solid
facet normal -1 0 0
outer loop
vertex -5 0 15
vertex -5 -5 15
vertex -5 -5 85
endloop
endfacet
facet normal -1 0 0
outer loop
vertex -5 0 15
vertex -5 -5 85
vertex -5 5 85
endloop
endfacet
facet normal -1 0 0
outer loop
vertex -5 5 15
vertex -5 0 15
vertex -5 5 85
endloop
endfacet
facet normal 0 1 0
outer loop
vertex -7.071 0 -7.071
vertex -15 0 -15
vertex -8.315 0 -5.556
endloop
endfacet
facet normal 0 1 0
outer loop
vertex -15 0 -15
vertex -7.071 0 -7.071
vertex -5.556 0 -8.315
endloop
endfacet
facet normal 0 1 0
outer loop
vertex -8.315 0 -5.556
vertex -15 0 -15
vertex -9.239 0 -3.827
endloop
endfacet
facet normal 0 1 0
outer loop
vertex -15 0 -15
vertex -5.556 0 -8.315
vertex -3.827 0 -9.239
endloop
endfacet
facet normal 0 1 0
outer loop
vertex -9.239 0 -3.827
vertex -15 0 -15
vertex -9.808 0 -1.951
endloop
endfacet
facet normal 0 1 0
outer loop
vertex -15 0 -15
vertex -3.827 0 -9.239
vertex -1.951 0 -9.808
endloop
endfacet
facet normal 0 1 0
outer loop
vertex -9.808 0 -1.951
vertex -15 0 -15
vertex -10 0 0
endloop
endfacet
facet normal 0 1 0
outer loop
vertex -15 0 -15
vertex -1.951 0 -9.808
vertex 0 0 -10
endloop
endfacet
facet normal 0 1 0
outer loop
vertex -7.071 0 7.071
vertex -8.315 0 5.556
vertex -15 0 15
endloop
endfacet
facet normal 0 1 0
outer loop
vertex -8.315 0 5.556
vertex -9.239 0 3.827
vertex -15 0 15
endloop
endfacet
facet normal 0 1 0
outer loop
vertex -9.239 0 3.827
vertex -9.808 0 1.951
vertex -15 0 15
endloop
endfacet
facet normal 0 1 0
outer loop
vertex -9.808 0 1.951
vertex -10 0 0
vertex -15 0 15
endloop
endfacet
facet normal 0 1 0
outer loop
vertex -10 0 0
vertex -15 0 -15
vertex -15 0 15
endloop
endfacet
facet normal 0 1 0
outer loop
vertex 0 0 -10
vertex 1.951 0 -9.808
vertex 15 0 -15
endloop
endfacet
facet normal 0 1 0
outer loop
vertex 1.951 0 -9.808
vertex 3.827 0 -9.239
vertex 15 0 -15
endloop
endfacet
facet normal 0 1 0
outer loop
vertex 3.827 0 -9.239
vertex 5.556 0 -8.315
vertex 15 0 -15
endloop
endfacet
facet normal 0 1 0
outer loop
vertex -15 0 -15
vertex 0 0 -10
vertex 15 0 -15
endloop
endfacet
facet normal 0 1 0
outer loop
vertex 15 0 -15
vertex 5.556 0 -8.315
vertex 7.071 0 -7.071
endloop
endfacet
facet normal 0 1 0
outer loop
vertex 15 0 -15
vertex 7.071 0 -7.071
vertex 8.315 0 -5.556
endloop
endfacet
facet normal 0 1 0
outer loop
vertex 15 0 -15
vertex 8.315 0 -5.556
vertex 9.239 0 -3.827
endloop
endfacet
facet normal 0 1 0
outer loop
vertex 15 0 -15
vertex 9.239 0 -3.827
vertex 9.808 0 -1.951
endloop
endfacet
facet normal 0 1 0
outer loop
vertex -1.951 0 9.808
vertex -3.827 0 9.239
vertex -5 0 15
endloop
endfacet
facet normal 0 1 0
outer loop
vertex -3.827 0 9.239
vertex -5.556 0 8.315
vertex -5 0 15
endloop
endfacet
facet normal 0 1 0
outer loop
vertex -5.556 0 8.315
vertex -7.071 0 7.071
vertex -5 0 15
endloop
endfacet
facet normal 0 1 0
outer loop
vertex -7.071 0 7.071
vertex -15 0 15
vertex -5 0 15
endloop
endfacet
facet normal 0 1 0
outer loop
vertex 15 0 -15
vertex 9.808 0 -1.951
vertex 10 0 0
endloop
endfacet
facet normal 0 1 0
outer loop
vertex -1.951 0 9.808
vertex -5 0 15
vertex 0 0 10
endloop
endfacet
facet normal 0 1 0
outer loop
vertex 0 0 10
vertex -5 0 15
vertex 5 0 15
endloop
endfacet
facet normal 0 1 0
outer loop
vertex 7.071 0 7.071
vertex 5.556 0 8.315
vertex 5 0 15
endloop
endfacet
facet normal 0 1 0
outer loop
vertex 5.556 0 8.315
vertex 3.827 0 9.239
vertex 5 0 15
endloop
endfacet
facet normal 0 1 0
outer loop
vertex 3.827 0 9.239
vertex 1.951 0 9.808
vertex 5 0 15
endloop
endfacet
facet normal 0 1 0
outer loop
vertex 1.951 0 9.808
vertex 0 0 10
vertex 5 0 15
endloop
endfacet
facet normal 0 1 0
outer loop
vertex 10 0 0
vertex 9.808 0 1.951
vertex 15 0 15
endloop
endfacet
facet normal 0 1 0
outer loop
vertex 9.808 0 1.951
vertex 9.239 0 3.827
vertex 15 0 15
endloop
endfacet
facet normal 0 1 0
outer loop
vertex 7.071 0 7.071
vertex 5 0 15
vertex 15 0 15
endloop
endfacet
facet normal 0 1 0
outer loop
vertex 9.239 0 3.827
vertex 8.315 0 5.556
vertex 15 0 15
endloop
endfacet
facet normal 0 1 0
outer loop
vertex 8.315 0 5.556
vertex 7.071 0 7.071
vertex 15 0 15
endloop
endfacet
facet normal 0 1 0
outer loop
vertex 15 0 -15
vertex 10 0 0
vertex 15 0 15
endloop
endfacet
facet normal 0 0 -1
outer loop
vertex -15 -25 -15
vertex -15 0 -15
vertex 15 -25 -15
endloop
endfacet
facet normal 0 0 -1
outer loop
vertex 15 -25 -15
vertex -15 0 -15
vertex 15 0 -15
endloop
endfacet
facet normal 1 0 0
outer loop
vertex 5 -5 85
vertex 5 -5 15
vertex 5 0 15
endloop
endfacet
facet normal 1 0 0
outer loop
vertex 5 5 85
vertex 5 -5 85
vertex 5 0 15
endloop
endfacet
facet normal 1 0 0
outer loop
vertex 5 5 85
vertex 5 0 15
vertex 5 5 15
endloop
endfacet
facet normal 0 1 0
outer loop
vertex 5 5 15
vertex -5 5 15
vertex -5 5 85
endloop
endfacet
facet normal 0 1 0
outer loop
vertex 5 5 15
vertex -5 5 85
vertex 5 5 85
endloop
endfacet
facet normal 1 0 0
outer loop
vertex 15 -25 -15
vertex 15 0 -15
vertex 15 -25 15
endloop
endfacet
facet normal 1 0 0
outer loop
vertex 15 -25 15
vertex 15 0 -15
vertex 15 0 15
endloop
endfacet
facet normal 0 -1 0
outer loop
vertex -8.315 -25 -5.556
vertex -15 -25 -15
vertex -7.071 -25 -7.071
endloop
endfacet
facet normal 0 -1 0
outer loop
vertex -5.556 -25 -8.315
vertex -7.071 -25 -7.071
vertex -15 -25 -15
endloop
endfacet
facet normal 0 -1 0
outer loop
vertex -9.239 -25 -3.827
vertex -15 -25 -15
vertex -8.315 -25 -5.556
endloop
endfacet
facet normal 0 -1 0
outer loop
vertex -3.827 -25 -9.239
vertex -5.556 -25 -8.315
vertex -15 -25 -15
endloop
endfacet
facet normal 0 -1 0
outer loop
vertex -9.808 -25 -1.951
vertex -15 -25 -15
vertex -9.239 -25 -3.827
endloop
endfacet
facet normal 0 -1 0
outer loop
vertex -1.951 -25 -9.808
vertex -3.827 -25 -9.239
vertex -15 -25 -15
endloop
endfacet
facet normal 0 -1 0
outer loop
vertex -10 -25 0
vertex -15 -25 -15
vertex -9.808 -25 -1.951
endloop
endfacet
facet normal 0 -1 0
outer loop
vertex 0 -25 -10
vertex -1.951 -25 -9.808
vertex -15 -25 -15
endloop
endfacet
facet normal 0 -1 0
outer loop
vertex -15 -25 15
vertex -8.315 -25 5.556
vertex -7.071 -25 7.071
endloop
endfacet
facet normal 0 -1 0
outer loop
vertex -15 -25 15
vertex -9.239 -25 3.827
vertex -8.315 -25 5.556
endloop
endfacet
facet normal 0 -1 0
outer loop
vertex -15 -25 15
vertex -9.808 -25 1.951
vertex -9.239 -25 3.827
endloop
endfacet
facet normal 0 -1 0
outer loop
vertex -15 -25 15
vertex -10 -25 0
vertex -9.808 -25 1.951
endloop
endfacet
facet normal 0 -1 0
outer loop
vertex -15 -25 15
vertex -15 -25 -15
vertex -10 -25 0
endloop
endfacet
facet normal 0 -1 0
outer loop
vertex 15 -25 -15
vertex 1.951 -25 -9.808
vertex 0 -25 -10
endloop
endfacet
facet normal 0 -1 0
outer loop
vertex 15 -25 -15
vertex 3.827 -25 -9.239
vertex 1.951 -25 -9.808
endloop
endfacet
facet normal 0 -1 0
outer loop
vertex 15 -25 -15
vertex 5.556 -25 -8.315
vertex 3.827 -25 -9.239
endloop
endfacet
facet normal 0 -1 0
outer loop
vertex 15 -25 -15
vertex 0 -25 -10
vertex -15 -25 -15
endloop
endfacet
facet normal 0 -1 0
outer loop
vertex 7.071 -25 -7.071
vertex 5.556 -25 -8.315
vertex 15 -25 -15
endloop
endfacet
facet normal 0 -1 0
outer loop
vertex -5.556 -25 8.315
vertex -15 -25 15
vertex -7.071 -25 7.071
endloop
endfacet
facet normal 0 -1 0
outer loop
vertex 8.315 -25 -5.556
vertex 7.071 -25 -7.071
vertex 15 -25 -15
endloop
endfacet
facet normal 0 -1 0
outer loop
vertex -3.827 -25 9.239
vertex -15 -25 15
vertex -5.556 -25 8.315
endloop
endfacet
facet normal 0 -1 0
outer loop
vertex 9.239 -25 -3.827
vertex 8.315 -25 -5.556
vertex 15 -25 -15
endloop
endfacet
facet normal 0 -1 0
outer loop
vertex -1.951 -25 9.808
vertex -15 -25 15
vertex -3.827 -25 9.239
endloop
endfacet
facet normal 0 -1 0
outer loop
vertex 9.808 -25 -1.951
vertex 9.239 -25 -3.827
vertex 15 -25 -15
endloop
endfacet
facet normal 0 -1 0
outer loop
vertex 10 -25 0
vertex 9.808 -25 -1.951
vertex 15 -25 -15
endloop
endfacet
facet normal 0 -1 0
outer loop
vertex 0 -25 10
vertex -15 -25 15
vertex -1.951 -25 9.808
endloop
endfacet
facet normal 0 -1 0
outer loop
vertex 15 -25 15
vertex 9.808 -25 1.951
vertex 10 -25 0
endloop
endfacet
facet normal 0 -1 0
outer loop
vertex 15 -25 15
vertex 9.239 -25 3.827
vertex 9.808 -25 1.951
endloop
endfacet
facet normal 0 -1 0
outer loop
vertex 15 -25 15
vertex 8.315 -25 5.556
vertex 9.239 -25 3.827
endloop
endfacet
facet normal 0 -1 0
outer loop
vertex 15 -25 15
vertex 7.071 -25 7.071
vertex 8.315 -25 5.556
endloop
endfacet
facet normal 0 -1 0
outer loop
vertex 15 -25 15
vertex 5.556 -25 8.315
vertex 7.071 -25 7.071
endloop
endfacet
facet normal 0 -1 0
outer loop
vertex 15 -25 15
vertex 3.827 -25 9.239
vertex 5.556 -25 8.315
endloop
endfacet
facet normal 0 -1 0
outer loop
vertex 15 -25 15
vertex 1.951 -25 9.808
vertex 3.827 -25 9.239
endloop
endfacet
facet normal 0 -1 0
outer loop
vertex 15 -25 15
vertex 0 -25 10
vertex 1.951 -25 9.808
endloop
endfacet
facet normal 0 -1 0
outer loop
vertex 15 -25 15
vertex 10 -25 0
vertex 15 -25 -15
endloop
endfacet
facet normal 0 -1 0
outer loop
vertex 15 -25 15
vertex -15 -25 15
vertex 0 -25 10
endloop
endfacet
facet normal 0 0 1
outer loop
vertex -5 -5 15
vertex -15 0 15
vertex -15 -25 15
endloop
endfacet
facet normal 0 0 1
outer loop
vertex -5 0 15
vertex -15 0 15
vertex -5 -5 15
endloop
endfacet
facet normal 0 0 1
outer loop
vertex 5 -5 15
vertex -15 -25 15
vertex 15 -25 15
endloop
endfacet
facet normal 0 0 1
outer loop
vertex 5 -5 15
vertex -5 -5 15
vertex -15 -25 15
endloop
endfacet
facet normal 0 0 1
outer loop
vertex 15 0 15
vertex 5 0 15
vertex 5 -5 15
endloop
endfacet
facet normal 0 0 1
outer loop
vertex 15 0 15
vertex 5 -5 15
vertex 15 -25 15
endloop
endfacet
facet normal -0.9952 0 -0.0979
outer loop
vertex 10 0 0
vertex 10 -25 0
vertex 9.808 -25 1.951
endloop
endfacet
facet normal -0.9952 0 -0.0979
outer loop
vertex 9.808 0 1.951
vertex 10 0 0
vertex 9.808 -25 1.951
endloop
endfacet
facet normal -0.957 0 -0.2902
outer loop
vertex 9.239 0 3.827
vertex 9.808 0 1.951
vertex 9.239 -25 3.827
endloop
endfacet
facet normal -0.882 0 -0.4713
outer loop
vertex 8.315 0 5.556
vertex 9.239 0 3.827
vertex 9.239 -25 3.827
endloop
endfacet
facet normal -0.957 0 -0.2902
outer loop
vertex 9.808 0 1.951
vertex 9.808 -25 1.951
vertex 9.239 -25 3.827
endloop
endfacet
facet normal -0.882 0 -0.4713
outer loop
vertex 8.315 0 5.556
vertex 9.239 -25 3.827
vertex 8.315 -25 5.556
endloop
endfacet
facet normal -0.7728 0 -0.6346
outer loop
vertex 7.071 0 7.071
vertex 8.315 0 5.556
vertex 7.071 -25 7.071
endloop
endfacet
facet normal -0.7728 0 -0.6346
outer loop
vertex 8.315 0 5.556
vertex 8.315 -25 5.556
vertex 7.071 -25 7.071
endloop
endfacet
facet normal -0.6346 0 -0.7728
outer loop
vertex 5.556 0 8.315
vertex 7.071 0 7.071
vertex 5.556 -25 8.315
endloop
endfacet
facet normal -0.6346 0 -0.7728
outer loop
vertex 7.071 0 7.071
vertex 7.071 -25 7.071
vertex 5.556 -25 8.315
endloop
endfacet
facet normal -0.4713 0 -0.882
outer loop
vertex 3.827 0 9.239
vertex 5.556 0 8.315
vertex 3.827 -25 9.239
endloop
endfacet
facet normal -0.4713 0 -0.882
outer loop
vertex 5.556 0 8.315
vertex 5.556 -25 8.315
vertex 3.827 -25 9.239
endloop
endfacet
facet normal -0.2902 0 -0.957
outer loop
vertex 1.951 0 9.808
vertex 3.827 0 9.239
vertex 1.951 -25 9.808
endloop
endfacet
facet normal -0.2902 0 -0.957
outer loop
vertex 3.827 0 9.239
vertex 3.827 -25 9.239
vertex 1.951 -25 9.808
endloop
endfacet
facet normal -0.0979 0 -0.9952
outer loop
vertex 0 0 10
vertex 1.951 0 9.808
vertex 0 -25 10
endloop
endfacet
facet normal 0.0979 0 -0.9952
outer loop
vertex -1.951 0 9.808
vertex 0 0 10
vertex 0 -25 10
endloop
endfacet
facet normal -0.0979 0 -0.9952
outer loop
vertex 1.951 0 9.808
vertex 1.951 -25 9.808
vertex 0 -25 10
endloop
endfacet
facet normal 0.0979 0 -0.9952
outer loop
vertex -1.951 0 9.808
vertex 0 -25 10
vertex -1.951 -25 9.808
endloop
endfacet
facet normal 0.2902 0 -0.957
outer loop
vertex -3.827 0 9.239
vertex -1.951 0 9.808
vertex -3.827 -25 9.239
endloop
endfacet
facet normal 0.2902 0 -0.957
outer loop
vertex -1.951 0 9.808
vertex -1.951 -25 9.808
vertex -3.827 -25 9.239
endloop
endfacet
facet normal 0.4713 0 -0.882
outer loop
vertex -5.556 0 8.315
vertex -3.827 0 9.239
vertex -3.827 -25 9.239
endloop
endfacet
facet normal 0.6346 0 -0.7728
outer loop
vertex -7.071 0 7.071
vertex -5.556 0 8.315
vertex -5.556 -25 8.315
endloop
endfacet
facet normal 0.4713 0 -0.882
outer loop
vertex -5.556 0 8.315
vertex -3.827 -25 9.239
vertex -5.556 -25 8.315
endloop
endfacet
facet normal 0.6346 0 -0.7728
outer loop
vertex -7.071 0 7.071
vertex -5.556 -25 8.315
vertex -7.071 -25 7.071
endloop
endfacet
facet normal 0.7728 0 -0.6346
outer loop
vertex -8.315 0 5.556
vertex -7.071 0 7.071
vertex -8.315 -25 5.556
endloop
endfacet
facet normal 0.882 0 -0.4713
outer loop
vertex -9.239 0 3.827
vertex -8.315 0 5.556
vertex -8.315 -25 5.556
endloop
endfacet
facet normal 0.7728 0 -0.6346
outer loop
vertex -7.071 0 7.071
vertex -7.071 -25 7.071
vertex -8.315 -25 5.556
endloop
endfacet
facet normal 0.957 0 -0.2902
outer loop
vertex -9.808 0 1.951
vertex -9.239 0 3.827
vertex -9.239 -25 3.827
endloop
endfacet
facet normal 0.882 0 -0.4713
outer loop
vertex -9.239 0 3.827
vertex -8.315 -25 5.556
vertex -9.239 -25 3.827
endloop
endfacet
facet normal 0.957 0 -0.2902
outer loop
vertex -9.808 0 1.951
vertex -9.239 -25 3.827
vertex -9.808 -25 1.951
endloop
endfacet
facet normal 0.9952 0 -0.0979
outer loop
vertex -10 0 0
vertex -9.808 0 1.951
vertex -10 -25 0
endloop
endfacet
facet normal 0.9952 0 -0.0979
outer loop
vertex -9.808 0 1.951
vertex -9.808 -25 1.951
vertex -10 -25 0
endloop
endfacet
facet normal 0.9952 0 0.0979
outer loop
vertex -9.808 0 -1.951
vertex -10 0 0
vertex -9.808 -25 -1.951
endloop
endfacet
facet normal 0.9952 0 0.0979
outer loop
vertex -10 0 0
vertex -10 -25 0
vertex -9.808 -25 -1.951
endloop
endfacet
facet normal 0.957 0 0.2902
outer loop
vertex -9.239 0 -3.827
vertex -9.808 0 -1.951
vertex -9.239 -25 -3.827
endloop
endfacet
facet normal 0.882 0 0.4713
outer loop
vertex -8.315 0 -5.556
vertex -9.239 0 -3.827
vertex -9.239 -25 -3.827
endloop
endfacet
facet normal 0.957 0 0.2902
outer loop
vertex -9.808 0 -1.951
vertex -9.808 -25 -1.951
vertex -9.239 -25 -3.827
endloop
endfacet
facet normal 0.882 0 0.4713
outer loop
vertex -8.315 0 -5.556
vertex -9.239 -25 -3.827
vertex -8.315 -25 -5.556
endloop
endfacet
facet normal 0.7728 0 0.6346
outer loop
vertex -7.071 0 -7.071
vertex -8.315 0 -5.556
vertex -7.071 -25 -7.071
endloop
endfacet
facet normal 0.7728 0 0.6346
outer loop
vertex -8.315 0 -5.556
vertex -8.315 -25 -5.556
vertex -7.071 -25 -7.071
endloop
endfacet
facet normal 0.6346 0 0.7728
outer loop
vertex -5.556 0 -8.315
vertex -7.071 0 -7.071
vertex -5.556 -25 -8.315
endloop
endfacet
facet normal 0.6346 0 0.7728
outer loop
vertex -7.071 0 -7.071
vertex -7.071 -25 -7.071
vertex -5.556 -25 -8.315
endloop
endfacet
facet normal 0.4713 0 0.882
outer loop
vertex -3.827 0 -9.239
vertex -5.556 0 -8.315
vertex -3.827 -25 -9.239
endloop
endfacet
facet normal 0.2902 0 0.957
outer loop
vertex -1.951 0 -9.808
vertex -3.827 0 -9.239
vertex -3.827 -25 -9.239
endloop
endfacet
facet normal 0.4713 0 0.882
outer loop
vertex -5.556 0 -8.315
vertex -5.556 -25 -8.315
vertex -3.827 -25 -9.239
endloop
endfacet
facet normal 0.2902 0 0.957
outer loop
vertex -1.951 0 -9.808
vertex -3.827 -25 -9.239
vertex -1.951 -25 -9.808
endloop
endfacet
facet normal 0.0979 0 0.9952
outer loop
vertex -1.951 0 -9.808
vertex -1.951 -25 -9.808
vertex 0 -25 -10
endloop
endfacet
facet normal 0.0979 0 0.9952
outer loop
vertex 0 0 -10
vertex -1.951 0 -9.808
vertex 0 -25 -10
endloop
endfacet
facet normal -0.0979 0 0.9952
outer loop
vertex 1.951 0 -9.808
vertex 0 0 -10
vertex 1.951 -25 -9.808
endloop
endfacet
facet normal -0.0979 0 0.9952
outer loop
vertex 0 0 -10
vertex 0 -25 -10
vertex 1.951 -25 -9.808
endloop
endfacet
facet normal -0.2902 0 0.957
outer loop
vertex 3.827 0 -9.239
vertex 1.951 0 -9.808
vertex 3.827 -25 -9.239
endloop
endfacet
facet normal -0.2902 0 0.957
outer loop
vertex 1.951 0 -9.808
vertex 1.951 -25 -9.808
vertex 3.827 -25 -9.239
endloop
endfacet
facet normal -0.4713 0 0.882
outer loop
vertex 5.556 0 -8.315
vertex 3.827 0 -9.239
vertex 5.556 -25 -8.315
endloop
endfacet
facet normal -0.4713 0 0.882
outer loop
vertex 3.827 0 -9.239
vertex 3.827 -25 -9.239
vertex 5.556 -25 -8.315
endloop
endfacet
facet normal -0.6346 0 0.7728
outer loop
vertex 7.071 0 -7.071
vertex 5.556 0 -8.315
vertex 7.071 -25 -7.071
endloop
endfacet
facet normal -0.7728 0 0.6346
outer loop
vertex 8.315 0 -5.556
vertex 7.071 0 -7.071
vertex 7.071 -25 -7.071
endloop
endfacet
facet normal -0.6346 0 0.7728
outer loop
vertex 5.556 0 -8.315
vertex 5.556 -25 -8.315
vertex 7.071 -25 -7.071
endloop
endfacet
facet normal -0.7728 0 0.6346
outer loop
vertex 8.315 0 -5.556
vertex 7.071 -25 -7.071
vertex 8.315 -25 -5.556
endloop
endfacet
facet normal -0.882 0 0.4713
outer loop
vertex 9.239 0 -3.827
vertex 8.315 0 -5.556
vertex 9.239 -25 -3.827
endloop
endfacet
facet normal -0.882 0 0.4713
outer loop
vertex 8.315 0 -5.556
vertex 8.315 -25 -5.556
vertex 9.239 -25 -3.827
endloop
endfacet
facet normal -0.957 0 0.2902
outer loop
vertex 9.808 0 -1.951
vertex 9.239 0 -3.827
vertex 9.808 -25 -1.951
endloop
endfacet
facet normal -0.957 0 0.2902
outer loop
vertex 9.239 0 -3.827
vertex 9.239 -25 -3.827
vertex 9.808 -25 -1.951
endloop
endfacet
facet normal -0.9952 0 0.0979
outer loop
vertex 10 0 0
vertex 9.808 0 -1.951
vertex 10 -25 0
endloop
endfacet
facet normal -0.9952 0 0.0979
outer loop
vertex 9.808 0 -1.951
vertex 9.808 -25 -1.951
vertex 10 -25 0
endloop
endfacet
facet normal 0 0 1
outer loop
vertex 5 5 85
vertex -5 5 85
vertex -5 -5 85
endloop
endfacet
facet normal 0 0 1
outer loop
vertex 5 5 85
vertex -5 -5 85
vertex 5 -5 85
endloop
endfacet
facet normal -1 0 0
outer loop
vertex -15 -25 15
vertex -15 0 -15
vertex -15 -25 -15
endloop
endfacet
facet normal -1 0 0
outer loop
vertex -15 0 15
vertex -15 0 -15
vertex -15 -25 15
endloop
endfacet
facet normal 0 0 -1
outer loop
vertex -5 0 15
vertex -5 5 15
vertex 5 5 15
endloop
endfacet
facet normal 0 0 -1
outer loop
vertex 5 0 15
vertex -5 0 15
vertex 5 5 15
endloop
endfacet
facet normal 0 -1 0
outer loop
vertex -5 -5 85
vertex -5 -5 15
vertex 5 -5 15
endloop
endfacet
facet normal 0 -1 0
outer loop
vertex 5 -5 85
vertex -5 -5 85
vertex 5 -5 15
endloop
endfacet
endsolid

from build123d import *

# Parameters (mm, degrees)
F0_W     = 30
F0_H     = 30
F1_DEPTH = 25
F2_R     = 10
F3_DEPTH = 25
F4_W     = 10
F4_H     = 10
F5_DEPTH = 70


with BuildPart() as f1:
    # F0 (on Front) → F1 (new body)
    with BuildSketch(Plane.XZ):
        Rectangle(F0_W, F0_H)
    extrude(amount=F1_DEPTH)

    # F2 (on face) → F3 (cut)
    with BuildSketch(Plane.XZ.offset(25)):
        Circle(F2_R)
    extrude(amount=-F3_DEPTH, mode=Mode.SUBTRACT)

    # F4 (on face) → F5 (join)
    with BuildSketch(Plane.XY.offset(15)):
        Rectangle(F4_W, F4_H)
    extrude(amount=F5_DEPTH)


solid = f1.part
